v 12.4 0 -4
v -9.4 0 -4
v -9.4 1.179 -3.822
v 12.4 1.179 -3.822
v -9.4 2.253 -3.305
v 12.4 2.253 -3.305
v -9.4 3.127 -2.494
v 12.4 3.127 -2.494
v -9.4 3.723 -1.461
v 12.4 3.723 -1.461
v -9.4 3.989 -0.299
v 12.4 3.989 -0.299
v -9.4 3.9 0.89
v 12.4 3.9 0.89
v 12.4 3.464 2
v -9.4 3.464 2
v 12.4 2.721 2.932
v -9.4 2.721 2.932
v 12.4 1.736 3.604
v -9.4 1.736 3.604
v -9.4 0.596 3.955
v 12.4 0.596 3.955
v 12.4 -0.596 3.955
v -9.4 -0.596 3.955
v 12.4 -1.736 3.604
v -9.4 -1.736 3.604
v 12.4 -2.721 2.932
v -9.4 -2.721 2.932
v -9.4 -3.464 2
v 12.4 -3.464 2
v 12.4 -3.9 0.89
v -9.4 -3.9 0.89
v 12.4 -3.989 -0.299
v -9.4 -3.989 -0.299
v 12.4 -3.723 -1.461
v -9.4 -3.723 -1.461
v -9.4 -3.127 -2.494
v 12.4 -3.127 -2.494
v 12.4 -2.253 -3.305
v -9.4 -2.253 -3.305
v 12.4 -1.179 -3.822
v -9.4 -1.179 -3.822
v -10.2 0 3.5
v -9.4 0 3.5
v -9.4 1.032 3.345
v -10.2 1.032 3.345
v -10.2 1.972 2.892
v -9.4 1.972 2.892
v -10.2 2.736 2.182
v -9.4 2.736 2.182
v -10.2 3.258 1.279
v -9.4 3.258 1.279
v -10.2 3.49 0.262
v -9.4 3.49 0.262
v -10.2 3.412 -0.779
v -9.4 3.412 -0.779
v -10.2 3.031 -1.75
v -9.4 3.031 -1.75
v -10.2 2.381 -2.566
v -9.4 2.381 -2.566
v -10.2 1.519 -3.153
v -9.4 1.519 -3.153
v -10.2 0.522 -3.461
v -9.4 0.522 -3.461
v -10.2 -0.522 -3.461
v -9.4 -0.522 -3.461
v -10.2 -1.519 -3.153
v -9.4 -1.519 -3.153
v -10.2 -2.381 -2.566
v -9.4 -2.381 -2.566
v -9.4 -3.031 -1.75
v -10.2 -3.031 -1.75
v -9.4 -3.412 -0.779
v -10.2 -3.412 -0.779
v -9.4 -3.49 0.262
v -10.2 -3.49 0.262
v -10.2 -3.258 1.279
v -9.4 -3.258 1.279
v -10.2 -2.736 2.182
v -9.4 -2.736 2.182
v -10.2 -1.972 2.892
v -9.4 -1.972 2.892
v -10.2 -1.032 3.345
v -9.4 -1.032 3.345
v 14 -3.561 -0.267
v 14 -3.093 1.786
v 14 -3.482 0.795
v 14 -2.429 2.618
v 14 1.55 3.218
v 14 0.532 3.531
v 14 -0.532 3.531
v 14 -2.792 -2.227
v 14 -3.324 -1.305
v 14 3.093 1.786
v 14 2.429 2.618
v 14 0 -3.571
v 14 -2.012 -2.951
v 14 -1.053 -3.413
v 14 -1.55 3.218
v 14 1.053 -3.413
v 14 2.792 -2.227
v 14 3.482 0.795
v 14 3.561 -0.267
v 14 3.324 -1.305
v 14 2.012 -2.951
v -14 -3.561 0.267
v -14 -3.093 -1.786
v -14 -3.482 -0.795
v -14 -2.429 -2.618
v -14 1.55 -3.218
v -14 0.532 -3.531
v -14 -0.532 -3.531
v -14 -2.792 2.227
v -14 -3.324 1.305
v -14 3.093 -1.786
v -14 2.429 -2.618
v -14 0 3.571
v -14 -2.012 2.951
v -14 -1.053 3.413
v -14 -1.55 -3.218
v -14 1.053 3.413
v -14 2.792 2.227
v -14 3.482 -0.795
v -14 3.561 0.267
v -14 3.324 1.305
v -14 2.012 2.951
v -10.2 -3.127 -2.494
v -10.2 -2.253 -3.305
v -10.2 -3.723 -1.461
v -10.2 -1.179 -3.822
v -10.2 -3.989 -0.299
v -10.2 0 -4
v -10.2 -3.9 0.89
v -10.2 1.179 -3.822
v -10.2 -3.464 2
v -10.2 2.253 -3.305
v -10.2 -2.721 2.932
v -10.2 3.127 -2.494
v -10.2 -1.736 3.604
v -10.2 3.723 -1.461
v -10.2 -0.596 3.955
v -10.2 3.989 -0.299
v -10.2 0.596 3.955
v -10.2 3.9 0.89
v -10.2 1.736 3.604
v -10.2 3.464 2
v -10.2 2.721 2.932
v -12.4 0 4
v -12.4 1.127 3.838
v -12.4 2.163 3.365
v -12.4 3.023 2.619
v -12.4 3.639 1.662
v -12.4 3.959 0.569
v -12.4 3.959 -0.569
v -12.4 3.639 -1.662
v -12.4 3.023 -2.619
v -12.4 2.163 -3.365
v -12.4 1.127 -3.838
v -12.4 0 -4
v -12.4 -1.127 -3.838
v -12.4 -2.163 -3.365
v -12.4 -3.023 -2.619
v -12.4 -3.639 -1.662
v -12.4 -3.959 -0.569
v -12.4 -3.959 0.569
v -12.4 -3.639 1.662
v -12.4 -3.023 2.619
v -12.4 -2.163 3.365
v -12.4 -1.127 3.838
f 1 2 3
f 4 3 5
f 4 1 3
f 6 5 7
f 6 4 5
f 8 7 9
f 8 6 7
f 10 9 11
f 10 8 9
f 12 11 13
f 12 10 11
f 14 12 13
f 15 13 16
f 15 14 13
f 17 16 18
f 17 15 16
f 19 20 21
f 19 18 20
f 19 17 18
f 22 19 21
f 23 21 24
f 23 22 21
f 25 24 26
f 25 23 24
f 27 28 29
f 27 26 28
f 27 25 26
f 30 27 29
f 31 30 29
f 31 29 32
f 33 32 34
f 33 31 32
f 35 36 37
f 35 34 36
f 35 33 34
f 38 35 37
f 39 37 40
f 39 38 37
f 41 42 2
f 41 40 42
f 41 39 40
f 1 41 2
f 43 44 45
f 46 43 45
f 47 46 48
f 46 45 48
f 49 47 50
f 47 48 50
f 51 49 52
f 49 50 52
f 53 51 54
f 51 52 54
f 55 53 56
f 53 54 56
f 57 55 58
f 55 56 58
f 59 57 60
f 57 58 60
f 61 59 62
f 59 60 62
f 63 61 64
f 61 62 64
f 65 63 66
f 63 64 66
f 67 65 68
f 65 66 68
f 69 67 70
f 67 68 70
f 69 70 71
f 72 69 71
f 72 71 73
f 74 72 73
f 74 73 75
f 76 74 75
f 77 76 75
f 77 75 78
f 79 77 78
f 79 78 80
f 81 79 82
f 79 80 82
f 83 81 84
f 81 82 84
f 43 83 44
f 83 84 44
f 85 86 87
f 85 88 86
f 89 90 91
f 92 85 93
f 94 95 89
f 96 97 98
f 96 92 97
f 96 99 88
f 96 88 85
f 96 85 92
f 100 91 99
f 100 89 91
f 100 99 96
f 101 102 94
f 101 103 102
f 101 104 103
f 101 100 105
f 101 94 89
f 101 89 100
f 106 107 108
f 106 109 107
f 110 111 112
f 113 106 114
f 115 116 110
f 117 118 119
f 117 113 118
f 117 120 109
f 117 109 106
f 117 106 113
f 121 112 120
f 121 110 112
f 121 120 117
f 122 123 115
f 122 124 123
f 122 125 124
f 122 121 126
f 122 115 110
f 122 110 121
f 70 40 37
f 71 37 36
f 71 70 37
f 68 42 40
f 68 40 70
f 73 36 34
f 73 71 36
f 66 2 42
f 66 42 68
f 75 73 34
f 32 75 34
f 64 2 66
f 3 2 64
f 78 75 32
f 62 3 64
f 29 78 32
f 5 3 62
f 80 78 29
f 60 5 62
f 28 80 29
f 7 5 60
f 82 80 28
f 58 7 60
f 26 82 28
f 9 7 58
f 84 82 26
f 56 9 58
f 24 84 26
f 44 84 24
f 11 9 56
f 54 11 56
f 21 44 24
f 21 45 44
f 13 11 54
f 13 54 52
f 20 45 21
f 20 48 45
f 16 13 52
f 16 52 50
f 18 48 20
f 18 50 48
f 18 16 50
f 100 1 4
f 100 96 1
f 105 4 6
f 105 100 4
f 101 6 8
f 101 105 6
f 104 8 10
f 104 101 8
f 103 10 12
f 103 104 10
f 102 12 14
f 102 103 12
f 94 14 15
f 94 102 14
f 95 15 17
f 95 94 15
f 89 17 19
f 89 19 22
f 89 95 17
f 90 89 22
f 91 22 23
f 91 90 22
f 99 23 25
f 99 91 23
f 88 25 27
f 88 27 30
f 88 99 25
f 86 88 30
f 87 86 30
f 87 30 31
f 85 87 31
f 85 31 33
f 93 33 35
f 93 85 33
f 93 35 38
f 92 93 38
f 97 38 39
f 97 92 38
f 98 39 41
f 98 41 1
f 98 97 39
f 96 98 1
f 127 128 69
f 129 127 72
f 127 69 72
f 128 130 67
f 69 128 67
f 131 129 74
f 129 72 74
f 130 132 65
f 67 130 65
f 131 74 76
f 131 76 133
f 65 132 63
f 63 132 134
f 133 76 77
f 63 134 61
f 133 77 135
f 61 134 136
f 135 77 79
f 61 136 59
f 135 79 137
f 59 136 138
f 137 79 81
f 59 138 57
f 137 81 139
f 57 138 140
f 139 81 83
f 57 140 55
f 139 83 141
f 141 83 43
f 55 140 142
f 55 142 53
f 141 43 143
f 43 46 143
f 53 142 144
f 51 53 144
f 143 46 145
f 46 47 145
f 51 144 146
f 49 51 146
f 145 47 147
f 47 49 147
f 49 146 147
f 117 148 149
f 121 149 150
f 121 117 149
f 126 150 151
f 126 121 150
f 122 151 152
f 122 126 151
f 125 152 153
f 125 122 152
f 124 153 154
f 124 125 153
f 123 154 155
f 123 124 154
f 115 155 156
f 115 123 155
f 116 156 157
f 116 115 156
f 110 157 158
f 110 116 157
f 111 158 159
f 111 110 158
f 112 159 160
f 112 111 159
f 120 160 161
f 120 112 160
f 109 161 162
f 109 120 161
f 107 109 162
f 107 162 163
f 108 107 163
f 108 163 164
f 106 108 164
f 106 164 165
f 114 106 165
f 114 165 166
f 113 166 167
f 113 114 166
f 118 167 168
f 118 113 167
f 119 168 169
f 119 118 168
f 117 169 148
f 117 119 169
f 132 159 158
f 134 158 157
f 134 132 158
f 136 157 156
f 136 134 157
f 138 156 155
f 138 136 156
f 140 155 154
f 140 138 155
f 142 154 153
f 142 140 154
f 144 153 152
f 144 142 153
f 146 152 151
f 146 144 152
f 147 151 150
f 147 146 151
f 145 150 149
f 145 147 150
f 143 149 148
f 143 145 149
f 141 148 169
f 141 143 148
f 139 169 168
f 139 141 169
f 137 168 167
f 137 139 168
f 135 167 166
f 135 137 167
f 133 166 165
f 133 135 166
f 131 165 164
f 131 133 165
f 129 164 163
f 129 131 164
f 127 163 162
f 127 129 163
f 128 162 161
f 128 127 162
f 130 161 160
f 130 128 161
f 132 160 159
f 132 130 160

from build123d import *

# Parameters (mm, degrees)
SKETCH2_R           = 4
EXTRUDE1_DEPTH      = 12.4
EXTRUDE1_DEPTH_BACK = 12.4
SKETCH3_R           = 4
EXTRUDE2_DEPTH      = 1.6
EXTRUDE2_TAPER      = 15
SKETCH4_R           = 4
EXTRUDE3_DEPTH      = 1.6
EXTRUDE3_TAPER      = 15
SKETCH5_R           = 4
SKETCH5_R_2         = 3.5
CUT_EXTRUDE1_DEPTH  = 0.8


with BuildPart() as part:
    # Sketch2 → Extrude1 (new body, two sides)
    with BuildSketch(Plane(origin=(0, 0, 0), x_dir=(0, 0, -1), z_dir=(1, 0, 0))) as extrude1_sk:
        Circle(SKETCH2_R)
    extrude(amount=EXTRUDE1_DEPTH)
    extrude(extrude1_sk.sketch, amount=-EXTRUDE1_DEPTH_BACK)

    # Sketch3 → Extrude2 (add)
    with BuildSketch(Plane(origin=(12.4, 0, 0), x_dir=(0, 0, -1), z_dir=(1, 0, 0))):
        Circle(SKETCH3_R)
    extrude(amount=EXTRUDE2_DEPTH, taper=EXTRUDE2_TAPER)

    # Sketch4 → Extrude3 (add)
    with BuildSketch(Plane.ZY.offset(12.4)):
        Circle(SKETCH4_R)
    extrude(amount=EXTRUDE3_DEPTH, taper=EXTRUDE3_TAPER)

    # Sketch5 → Cut-Extrude1 (cut)
    with BuildSketch(Plane.ZY.offset(9.40000006)):
        Circle(SKETCH5_R)
        Circle(SKETCH5_R_2, mode=Mode.SUBTRACT)
    extrude(amount=CUT_EXTRUDE1_DEPTH, mode=Mode.SUBTRACT)


solid = part.part
